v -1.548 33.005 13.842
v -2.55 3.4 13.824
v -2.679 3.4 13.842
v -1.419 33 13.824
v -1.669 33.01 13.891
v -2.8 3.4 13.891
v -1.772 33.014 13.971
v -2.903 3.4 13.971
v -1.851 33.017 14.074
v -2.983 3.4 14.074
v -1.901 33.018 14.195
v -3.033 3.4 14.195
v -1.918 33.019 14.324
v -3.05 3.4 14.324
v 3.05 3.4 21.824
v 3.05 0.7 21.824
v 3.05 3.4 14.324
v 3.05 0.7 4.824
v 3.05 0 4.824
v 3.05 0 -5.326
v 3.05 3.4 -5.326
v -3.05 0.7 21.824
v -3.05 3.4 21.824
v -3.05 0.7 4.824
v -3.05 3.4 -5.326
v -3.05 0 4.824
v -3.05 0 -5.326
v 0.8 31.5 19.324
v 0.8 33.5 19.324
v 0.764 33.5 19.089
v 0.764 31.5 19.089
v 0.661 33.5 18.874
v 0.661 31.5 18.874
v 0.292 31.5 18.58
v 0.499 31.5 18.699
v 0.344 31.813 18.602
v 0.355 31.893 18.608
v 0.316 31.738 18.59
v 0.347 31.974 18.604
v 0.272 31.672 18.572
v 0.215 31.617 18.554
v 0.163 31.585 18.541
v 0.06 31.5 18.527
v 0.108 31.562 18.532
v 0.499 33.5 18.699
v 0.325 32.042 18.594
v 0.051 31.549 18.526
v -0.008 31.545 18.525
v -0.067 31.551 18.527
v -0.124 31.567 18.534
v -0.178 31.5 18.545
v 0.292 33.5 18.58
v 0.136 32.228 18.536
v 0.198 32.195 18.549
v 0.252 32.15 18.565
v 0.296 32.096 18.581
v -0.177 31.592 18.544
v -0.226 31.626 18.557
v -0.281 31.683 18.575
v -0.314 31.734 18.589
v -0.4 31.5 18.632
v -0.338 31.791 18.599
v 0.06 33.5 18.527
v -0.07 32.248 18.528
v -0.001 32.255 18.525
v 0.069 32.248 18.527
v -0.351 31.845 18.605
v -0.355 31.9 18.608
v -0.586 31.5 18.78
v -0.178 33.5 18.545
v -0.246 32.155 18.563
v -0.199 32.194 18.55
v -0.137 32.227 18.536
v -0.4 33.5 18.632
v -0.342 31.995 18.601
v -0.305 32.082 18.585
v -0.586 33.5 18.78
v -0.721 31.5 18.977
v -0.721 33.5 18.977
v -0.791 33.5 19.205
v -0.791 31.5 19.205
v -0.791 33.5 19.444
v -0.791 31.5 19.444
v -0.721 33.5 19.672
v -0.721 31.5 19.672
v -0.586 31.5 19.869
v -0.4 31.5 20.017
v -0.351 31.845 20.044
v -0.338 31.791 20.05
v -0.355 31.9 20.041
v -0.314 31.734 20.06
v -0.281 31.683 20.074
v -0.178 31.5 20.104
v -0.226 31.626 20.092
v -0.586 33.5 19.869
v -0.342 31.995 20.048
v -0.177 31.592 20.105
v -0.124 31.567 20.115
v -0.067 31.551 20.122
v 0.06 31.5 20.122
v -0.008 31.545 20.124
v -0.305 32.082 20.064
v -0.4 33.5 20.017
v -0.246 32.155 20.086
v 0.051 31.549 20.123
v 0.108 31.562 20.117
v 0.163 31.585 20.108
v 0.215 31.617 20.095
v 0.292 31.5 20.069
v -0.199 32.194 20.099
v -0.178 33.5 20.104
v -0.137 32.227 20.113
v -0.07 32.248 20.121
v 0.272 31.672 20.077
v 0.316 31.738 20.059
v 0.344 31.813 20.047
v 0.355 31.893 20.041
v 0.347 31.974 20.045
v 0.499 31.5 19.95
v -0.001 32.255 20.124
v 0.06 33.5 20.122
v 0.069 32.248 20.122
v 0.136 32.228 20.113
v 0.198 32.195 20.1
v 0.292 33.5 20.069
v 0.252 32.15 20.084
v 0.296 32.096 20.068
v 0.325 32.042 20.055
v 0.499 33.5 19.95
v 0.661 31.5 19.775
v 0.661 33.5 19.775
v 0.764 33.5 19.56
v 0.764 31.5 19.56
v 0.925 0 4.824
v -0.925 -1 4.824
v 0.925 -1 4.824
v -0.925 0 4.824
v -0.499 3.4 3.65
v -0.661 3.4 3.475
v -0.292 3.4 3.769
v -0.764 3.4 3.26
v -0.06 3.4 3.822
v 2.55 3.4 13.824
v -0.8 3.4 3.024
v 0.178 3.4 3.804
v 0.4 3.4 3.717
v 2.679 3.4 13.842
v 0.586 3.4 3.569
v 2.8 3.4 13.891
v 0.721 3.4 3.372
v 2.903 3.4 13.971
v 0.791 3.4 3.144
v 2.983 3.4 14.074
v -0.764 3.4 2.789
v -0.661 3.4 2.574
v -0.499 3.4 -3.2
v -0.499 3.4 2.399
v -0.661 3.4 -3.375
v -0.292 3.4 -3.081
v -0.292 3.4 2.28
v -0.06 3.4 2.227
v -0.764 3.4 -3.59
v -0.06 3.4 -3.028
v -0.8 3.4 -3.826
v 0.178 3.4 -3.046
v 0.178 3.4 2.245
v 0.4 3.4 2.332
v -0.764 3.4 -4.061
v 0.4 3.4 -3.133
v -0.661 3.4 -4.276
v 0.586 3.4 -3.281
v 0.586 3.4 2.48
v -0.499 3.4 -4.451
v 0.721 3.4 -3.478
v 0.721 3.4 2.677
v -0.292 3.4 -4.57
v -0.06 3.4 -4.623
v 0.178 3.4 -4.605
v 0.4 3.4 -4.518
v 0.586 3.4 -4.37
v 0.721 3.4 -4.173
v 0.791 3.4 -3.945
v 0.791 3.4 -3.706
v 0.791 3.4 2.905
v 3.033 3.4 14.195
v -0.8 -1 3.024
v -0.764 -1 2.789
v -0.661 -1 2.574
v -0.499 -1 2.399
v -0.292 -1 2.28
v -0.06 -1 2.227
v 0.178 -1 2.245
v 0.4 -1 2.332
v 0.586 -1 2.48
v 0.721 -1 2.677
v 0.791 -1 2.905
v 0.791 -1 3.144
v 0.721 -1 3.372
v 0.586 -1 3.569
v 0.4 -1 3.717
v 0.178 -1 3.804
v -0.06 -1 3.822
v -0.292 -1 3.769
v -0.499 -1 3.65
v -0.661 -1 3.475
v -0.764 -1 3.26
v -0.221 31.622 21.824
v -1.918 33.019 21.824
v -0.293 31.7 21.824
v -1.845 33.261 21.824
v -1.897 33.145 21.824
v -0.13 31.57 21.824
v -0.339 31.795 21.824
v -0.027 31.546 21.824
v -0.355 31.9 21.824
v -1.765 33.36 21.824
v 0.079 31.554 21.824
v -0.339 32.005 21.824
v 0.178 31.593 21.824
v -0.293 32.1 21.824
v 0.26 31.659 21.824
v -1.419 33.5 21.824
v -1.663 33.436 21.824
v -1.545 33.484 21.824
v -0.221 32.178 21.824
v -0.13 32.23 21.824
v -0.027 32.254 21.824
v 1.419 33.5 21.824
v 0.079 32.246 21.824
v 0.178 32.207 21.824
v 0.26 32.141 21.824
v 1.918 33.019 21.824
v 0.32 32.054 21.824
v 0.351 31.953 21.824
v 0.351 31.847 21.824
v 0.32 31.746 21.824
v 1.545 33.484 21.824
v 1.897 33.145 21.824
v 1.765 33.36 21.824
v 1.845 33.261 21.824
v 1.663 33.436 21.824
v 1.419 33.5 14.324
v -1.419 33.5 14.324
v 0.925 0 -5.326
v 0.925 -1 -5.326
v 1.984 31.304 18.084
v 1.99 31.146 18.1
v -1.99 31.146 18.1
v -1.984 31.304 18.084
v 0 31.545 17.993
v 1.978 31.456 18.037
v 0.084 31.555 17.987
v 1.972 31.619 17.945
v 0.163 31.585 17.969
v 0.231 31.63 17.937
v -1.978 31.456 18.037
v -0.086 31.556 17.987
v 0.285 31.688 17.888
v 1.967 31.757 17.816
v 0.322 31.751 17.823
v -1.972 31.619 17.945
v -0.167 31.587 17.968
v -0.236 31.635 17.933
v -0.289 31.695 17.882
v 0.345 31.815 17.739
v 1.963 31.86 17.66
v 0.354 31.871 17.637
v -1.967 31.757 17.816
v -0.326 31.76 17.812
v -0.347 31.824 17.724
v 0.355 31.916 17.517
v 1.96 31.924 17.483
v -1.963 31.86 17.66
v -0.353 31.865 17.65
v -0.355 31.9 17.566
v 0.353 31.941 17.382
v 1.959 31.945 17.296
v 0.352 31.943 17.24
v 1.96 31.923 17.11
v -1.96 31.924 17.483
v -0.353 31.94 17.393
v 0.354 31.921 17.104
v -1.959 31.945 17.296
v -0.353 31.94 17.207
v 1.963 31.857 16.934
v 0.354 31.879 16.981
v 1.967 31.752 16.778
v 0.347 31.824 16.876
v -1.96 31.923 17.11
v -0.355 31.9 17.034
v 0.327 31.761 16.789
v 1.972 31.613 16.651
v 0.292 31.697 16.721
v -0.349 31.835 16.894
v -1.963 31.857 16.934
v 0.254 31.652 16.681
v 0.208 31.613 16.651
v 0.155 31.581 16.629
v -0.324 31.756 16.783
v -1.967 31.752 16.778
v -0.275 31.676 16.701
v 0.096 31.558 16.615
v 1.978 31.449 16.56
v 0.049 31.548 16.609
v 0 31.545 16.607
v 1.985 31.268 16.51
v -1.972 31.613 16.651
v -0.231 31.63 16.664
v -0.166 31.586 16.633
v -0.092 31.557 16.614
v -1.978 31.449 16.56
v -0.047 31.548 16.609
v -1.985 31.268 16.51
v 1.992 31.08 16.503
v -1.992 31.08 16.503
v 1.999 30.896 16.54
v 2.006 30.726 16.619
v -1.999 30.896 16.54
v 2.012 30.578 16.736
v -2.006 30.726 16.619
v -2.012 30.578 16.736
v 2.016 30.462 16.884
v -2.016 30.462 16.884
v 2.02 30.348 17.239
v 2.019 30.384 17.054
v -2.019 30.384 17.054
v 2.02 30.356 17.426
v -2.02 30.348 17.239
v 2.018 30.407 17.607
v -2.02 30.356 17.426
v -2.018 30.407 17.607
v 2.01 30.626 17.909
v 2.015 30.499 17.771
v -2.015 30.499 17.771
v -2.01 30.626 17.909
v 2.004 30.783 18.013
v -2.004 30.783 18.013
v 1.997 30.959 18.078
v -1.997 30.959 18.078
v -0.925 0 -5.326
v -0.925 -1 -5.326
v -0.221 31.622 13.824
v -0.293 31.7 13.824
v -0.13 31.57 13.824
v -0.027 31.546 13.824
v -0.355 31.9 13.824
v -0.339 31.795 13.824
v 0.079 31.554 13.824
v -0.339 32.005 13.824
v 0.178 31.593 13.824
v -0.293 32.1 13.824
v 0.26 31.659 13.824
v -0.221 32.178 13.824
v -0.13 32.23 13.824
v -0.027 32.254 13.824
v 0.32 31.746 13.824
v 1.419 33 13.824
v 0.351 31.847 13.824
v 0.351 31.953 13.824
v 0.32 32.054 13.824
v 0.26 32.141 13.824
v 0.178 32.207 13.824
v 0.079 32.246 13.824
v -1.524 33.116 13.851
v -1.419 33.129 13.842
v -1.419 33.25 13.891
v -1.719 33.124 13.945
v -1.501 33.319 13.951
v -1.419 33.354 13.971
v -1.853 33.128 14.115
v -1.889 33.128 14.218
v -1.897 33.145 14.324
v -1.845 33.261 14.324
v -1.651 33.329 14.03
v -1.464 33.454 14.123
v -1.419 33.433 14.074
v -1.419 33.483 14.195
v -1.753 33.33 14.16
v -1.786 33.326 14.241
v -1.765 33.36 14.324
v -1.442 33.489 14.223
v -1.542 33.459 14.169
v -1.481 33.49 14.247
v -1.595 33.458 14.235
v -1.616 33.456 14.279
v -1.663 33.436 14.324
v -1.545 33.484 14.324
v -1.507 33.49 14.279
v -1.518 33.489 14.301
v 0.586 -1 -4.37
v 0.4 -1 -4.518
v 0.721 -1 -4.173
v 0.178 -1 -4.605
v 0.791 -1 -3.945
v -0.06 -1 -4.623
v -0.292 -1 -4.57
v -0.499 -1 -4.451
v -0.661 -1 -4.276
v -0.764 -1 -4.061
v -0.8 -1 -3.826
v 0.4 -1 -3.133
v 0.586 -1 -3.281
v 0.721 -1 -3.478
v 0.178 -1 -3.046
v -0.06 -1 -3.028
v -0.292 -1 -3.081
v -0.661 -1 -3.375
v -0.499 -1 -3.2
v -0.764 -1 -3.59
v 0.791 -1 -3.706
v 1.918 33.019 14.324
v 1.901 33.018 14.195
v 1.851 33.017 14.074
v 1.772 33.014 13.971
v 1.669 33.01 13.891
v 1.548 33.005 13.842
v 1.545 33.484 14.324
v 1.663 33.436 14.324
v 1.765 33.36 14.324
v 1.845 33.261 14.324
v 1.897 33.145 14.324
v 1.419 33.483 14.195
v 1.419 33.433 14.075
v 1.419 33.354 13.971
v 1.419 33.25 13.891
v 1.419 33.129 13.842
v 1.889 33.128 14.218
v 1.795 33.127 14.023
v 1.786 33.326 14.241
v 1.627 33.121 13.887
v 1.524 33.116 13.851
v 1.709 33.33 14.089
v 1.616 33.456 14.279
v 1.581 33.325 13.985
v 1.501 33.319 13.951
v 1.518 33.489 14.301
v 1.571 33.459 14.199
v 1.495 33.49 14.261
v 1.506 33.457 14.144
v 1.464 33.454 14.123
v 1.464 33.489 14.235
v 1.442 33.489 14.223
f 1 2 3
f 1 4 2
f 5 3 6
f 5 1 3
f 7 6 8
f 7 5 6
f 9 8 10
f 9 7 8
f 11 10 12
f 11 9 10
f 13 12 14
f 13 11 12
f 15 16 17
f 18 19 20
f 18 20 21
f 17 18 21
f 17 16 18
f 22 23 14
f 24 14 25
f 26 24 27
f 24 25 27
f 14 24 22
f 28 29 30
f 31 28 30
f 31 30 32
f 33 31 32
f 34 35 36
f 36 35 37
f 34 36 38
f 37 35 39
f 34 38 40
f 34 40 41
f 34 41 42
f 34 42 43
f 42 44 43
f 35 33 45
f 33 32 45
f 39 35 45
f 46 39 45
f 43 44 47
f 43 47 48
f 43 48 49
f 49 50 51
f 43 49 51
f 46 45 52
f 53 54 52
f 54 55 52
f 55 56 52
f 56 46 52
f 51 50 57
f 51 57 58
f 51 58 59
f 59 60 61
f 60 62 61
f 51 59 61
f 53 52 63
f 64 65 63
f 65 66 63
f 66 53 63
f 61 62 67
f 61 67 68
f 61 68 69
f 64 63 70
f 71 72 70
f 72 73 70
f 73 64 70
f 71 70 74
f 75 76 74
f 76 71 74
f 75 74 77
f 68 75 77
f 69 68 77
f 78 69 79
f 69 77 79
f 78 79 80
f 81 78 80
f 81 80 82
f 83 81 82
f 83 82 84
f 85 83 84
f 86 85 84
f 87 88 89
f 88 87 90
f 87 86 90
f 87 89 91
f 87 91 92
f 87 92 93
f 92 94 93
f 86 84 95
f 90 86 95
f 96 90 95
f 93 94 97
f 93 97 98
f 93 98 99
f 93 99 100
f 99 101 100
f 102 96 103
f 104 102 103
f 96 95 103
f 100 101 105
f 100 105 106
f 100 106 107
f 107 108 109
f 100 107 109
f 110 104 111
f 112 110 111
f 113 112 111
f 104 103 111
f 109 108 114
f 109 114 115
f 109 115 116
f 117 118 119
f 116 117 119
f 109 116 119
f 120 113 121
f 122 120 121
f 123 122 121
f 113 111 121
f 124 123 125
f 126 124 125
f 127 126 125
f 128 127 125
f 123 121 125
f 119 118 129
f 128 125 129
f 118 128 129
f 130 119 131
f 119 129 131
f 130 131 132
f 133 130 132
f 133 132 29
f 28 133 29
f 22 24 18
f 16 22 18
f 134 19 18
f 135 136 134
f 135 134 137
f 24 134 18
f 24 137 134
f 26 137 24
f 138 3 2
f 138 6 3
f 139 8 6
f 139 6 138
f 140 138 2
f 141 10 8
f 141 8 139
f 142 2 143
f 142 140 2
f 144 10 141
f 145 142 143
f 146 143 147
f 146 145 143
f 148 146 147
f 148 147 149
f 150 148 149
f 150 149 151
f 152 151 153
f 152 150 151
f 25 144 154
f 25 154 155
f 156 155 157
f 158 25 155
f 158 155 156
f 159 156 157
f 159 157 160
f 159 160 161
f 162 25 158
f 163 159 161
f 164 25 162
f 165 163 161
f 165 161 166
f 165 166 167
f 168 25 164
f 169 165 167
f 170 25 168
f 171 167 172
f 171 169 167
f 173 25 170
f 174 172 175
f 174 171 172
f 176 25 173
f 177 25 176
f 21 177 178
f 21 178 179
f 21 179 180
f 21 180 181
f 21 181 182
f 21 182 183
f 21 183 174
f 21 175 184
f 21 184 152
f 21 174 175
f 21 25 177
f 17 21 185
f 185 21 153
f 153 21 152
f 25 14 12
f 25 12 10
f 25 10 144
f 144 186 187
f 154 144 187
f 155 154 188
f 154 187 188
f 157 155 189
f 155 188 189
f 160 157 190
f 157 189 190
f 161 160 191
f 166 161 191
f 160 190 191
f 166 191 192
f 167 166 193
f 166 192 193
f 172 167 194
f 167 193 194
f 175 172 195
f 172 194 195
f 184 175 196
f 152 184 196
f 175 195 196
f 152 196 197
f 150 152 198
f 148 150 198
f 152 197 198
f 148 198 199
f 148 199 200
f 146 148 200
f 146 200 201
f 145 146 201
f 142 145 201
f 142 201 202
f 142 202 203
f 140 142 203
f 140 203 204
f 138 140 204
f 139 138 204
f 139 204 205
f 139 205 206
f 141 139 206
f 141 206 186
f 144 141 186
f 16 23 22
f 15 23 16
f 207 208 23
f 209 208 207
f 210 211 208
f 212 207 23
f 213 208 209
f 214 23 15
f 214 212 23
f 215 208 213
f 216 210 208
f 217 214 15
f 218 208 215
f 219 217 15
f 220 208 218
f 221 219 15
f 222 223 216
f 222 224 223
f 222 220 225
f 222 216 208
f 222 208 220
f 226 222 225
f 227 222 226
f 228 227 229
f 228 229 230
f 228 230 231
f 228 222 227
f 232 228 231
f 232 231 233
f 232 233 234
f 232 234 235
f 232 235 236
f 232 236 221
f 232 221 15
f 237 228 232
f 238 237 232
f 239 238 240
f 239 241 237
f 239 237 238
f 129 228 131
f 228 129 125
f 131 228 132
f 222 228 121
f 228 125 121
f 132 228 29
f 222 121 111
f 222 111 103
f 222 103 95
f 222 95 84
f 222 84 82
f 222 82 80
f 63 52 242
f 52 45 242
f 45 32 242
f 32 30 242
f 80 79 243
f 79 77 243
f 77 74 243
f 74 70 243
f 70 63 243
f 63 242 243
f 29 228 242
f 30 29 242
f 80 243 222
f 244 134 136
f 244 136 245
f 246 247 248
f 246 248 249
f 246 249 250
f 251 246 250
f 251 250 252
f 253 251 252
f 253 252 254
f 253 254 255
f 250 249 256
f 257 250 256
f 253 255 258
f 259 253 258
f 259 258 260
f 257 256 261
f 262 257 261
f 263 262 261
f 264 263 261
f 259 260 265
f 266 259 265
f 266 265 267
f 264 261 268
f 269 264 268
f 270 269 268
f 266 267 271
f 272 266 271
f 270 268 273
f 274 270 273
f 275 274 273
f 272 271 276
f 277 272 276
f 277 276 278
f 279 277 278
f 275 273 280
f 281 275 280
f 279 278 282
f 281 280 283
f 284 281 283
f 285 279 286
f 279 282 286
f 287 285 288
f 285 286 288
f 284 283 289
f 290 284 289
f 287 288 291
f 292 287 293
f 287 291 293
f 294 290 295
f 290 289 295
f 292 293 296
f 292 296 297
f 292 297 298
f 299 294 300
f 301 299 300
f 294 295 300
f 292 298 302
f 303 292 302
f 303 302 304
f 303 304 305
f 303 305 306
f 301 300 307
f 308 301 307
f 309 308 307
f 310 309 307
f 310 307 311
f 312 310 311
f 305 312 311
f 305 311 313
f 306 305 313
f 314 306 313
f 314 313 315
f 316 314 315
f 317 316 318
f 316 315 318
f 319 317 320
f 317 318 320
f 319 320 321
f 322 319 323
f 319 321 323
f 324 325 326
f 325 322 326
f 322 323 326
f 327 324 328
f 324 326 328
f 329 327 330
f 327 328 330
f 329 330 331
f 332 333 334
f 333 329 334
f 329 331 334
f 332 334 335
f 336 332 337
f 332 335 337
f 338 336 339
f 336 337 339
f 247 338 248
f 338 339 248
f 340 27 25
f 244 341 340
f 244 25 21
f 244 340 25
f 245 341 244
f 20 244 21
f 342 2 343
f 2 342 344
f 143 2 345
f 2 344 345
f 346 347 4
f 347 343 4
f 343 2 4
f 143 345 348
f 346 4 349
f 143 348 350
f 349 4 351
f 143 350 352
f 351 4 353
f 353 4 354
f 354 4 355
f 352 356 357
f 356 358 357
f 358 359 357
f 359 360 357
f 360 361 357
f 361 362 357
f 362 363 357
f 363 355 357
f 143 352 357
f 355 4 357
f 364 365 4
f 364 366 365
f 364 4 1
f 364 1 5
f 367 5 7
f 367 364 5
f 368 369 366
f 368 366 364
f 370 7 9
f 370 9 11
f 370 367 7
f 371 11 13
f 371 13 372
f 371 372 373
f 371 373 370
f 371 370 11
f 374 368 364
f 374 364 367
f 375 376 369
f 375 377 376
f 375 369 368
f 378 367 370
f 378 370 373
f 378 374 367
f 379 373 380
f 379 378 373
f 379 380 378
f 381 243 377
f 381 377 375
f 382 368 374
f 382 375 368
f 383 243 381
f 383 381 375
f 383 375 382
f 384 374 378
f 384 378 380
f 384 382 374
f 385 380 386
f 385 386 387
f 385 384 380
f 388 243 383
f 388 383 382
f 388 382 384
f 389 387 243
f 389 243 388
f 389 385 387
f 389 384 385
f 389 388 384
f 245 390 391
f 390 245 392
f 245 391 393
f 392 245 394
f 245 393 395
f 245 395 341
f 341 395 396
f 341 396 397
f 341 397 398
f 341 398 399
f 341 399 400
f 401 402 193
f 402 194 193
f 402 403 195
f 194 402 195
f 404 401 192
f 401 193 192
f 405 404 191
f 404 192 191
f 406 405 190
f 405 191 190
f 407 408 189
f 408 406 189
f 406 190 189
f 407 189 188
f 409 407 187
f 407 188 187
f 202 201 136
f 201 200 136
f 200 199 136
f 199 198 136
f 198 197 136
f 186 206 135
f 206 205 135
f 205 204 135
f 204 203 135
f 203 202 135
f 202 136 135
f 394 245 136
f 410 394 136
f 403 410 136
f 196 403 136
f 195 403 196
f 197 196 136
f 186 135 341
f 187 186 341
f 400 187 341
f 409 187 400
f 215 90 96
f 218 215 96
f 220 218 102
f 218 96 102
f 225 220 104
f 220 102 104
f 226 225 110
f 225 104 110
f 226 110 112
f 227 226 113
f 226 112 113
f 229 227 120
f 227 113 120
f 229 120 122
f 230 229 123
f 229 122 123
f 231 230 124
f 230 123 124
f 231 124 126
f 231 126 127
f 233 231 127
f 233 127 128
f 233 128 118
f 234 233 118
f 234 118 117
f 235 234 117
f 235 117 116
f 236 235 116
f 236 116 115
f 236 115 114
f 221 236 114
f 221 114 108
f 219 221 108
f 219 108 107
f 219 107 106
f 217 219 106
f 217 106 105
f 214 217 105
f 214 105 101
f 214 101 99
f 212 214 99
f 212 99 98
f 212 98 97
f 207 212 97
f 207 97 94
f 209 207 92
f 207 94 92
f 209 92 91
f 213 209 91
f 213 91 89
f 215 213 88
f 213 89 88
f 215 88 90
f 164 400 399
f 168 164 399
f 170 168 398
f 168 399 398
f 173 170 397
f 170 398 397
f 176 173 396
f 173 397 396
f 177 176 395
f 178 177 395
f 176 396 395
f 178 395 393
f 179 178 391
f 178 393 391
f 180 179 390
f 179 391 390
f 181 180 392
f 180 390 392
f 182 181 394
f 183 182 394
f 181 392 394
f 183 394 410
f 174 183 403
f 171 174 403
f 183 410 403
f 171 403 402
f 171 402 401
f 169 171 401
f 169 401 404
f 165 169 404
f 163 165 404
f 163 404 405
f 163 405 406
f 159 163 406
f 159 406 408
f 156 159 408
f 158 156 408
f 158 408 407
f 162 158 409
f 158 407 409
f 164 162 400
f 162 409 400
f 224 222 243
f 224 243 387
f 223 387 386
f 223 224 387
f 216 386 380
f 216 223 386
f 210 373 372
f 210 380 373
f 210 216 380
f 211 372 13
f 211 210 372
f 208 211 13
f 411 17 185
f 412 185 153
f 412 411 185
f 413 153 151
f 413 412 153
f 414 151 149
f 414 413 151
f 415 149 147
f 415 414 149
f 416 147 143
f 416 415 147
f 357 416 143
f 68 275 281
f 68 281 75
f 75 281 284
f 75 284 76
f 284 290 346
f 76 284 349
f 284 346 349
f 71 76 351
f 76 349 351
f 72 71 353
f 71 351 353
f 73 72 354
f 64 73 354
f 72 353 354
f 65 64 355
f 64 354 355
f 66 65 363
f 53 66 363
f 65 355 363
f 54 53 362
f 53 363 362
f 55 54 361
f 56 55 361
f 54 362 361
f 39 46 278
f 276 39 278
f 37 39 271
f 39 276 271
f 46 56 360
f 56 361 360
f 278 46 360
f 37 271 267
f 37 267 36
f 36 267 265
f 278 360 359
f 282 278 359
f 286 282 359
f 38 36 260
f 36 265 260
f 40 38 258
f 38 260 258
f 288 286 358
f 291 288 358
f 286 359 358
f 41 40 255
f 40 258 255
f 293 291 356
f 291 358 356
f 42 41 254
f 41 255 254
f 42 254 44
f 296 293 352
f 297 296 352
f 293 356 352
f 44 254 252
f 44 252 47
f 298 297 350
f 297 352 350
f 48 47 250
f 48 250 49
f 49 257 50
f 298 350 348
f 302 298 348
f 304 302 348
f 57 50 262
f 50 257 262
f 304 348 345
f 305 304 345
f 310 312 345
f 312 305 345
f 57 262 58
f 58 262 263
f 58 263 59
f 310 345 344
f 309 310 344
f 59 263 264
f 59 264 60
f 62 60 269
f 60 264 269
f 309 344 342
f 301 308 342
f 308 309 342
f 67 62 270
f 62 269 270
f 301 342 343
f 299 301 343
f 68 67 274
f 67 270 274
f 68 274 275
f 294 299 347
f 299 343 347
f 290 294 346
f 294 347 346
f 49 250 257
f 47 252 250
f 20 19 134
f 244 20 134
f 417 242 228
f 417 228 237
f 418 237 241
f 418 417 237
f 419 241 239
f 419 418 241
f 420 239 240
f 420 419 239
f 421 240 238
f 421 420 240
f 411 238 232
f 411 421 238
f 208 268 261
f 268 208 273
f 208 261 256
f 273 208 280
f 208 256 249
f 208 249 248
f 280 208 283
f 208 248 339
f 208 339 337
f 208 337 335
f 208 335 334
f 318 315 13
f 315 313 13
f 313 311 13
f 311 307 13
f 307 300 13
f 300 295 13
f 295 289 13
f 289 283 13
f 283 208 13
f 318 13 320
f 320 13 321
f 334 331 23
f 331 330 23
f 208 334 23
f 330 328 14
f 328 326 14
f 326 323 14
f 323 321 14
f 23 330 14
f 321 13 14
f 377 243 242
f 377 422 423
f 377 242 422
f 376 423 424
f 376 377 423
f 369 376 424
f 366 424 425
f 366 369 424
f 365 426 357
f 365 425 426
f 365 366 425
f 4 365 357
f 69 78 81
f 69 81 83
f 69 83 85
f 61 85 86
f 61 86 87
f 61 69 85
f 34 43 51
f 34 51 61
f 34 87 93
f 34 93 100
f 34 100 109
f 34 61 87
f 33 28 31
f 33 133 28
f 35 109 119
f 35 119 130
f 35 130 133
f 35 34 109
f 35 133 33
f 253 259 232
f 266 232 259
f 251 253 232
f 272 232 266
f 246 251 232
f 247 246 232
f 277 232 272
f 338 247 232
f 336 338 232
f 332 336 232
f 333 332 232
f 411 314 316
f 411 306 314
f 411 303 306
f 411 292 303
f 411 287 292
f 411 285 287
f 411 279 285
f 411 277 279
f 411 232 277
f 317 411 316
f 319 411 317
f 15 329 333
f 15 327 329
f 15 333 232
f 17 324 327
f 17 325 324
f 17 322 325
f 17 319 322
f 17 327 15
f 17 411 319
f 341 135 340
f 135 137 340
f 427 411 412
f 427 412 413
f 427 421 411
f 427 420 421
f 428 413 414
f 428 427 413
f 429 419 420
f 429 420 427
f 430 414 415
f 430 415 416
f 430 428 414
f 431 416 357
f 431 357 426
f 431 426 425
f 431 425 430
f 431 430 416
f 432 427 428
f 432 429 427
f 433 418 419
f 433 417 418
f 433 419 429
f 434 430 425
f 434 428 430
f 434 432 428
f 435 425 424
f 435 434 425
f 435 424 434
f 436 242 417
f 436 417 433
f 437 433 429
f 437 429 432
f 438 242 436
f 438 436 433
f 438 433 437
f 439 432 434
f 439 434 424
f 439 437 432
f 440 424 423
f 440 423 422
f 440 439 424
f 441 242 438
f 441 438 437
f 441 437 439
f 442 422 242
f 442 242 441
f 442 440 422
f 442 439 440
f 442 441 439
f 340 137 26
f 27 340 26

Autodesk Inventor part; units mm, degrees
ref_plane "YZ Plane" through (0, 0, 0) normal (1, 0, 0) x (0, 1, 0)
ref_plane "XZ Plane" through (0, 0, 0) normal (0, 1, 0) x (-1, 0, 0)
sketch "Sketch1" plane through (0, 0, 0) normal (0, 1, 0) x (-1, 0, 0)
  line L0 (3.05, -5.3255) -> (-3.05, -5.3255)
  line L1 (-3.05, -5.3255) -> (-3.05, 4.8245)
  line L2 (-3.05, 4.8245) -> (3.05, 4.8245)
  line L3 (3.05, 4.8245) -> (3.05, -5.3255)
  line L4 (0.925, 4.8245) -> (-0.925, 4.8245)
  line L5 (0.925, 4.8245) -> (0.925, -5.3255)
  line L6 (-0.925, 4.8245) -> (-0.925, -5.3255)
  circle A0 centre (0, 3.0245) radius 0.8
  circle A1 centre (0, -3.8255) radius 0.8
  line L7 (0, 4.8245) -> (0, -5.3255)
  line L8 (-3.05, 0) -> (3.05, 0)
  point P0 (0, 0)
  dimension "d13" = 6.1
  dimension "d44" = 1.85
  dimension "d45" = 2.125
  dimension "d46" = 1.6
  dimension "d47" = 1.6
  dimension "d128" = 6.85
extrude "Extrusion1" add sketch "Sketch1" along normal blind 3.4 contours L0 L5 L8 L3 | L0 L7 A1 L8 L5 | L8 L5 L2 L3 | L0 L6 L8 L7 A1 | L8 L7 A0 L2 L5 | L0 L1 L8 L6 | L8 L6 L2 L7 A0 | L8 L1 L2 L6
extrude "Extrusion6" add sketch "Sketch1" against normal blind 1 contours L0 L7 A1 L8 L5 | L0 L6 L8 L7 A1 | L8 L7 A0 L2 L5 | L8 L6 L2 L7 A0
sketch "Sketch13" plane through (-3.05, 3.4, 4.8245) normal (0, 0, 1) x (1, 0, 0)
  line L0 (0, 0) -> (0, -2.7)
  line L1 (0, -3.4) -> (0, 0) projected
  line L2 (0, -2.7) -> (6.1, -2.7)
  line L3 (6.1, -3.4) -> (6.1, 0) projected
  line L4 (6.1, 0) -> (6.1, -2.7)
  line L5 (0, 0) -> (6.1, 0)
  point P0 (3.05, -3.4)
  point P1 (6.1, -3.41)
  dimension "d56" = 2.7
extrude "Extrusion8" add sketch "Sketch13" along normal blind 17
sketch "Sketch17" plane through (-3.05, 3.4, 21.8245) normal (0, 0, 1) x (1, 0, 0)
  line L0 (6.1, 0) -> (0, 0) projected
  line L1 (6.1, 0) -> (19.567, 0) construction
  line L2 (16.968, 8.2706) -> (10.0894, 18.4685)
  line L3 (10.0894, 18.4685) -> (13.5713, 20.8172)
  line L4 (13.5713, 20.8172) -> (20.102, 11.1351)
  line L5 (20.102, 11.1351) -> (22.1374, 8.1174)
  line L6 (6.1, -3.4) -> (6.1, -2.7) projected
  line L7 (22.1374, 8.1174) -> (6.1, -2.7)
  line L8 (6.1, 0) -> (6.1, -2.7)
  line L9 (6.1, 0.94) -> (6.1, 0)
  line L10 (6.1, 0.94) -> (3.05, 0.94)
  line L11 (3.05, 0.94) -> (3.05, 0)
  line L12 (16.968, 8.2706) -> (6.1, 0.94)
  line L13 (6.1, 0.94) -> (7.7497, 0.94)
  point P0 (3.05, -3.4)
  dimension "d74" = 12.301
  dimension "d75" = 4.2
  dimension "d92" = 3.64
  dimension "d93" = 3.64
  dimension "d94" = 10.868
  dimension "d98" = 34
extrude "Extrusion12" [suppressed]
ref_plane "Work Plane3" through (-3.05, 3.4, 13.8245) normal (0, 0, 1) x (1, 0, 0)
sketch "Sketch29" plane through (-3.05, 3.4, 13.8245) normal (0, 0, 1) x (1, 0, 0)
  line L0 (3.85, -4.4) -> (2.25, -4.4) projected
  line L1 (3.05, -4.4) -> (3.05, 30.1)
  line L2 (4.95, 30.1) -> (3.05, 30.1)
  line L3 (3.05, 30.1) -> (1.15, 30.1)
  line L4 (6.1, -3.4) -> (6.1, 0) projected
  line L5 (4.95, 30.1) -> (6.1, 0)
  line L6 (0, -3.4) -> (0, 0) projected
  line L7 (1.15, 30.1) -> (0, 0)
  line L8 (0, 0) -> (6.1, 0)
  point P0 (3.05, -3.4)
  point P1 (3.0506, 28.6)
  dimension "d137" = 34.5
  dimension "d138" = 3.8
extrude "Extrusion20" add sketch "Sketch29" along normal blind 8
fillet "Fillet6" radius 0.5 2 edges at (2.475, 18.45, 13.8245) (-2.475, 18.45, 13.8245)
sketch "Sketch14" plane through (0, 3.4, 0) normal (0, 1, 0) x (1, 0, 0)
  line L0 (3.05, 5.3255) -> (3.05, -21.8245) projected
  line L1 (3.05, -21.8245) -> (3.05, -13.8245)
  line L2 (3.05, -13.8245) -> (-3.05, -13.8245)
  line L3 (-3.05, 5.3255) -> (-3.05, -21.8245) projected
  line L4 (-3.05, -21.8245) -> (3.05, -21.8245)
  point P0 (0, 0)
  dimension "d59" = 8
extrude "Extrusion9" [suppressed]
sketch "Sketch16" plane through (0, 35.4, 0) normal (0, 1, 0) x (1, 0, 0)
  circle A0 centre (-0.1175, -18.652) radius 1.5
  line L0 (1.9325, -20.707) -> (-1.9325, -20.707) projected
  line L1 (1.9325, -14.9419) -> (1.9325, -20.707) projected
  point P0 (0, 0)
  point P1 (0, -20.707)
  dimension "d67" = 3
  dimension "d68" = 2.055
  dimension "d69" = 2.05
extrude "Extrusion11" [suppressed]
sketch "Sketch15" plane through (-3.05, 3.4, 21.8245) normal (0, 0, 1) x (1, 0, 0)
  line L0 (2.6762, 10.6502) -> (2.7739, 7.8519) construction
  line L1 (6.1, 0) -> (4.9825, 32) projected
  line L2 (1.6768, 10.6153) -> (1.7746, 7.817)
  line L3 (3.7733, 7.8868) -> (3.6756, 10.6851)
  arc A0 (3.6756, 10.6851) -> (1.6768, 10.6153) centre (2.6762, 10.6502) ccw
  arc A1 (1.7746, 7.817) -> (3.7733, 7.8868) centre (2.7739, 7.8519) ccw
  point P0 (3.05, -3.4)
  point P1 (2.7251, 9.251)
  dimension "d62" = 1.4
  dimension "d63" = 2
  dimension "d64" = 3.05
extrude "Extrusion10" [suppressed]
sketch "Sketch20" plane through (10.5213, 24.2172, 21.8245) normal (-0.5591929, 0.8290376, 0) x (0.8290376, 0.5591929, 0)
  circle A0 centre (-2.15, 2.0494) radius 1.5
  line L0 (-4.2, 0) -> (-4.2, 4.1) projected
  line L1 (0, 0) -> (-4.2, 0) projected
  point P0 (-22.2646, 21.8245)
  point P1 (-2.1, 0)
  dimension "d82" = 3
  dimension "d83" = 2.05
  dimension "d84" = 2.05
extrude "Extrusion14" [suppressed]
sketch "Sketch18" plane through (-3.05, 3.4, 21.8245) normal (0, 0, 1) x (1, 0, 0)
  line L0 (12.7441, 18.3775) -> (14.3099, 16.0562) construction
  line L1 (11.9151, 17.8183) -> (13.4808, 15.497)
  line L2 (15.1389, 16.6154) -> (13.5732, 18.9367)
  arc A0 (13.5732, 18.9367) -> (11.9151, 17.8183) centre (12.7441, 18.3775) ccw
  arc A1 (13.4808, 15.497) -> (15.1389, 16.6154) centre (14.3099, 16.0562) ccw
  line L3 (22.1374, 8.1174) -> (13.5713, 20.8172) projected
  line L4 (10.0894, 18.4685) -> (13.5713, 20.8172) projected
  point P0 (3.05, -3.4)
  point P1 (13.527, 17.2169)
  point P2 (12.1849, 19.2066)
  dimension "d78" = 1.4
  dimension "d79" = 2
  dimension "d89" = 0.56
  dimension "d90" = 2.05
extrude "Extrusion13" [suppressed]
sketch "Sketch21" plane through (13.7716, 15.5536, 19.7751) normal (-0.5591929, 0.8290376, 0) x (0.8290376, 0.5591929, 0)
  circle A0 centre (0, 0) radius 0.868
  point P0 (-20.1146, 19.7751)
extrude "Extrusion15" [suppressed]
mirror "Mirror3" [suppressed]
chamfer "Chamfer1" [suppressed]
fillet "Fillet1" [suppressed]
sketch "Sketch24" plane through (-3.05, 0, -5.3255) normal (-1, 0, 0) x (0, 0, 1)
  circle A0 centre (22.6257, 31.1455) radius 0.8
  point P0 (5.3255, 0)
  point P1 (27.15, 0.7)
  dimension "d109" = 1.6
extrude "Extrusion18" cut sketch "Sketch24" against normal through all
sketch "Sketch26" plane through (0, 35.4, 0) normal (0, 1, 0) x (1, 0, 0)
  circle A0 centre (0, -19.1945) radius 0.8
  point P0 (0, 0)
  dimension "d131" = 1.6
extrude "Extrusion19" [suppressed]
fillet "Fillet4" [suppressed]
sketch "Sketch31" plane through (-3.05, 3.4, 13.8245) normal (0, 0, -1) x (-1, 0, 0)
  line L0 (-3.05, -3.4) -> (-3.05, 28.5)
  circle A0 centre (-3.05, 28.5) radius 0.355
  dimension "d145" = 31.9
  dimension "d147" = 0.71
extrude "Extrusion22" cut sketch "Sketch31" against normal through all
sketch "Sketch33" plane through (-1.9, 33.5, 21.8245) normal (0, 1, 0) x (1, 0, 0)
  line L0 (3.8, 0) -> (0, 0) projected
  line L1 (3.8, 7.5) -> (3.8, 0) projected
  line L2 (0, 7.5) -> (0, 0) projected
  circle A0 centre (1.9, 2.5) radius 0.8
  line L3 (1.9, 2.5) -> (3.8, 2.5)
  line L4 (1.9, 2.5) -> (0, 2.5)
  point P0 (1.9, 21.8245)
  dimension "d150" = 1.6
  dimension "d151" = 2.5
extrude "Extrusion23" cut sketch "Sketch33" against normal blind 2 contours L3 L4 A0 | A0 L4 L3
fillet "Fillet7" radius 0.5 4 edges at (-1.9, 33.5, 18.0745) (1.7534, 33.5, 13.9709) (0, 33.5, 13.8245) (1.9, 33.5, 18.0745)
sketch "Sketch34" plane through (-3.05, 3.4, 13.8245) normal (0, 0, -1) x (-1, 0, 0)
  point P0 (-3.05, -3.4)
equation "\"d13\" = base_width"
equation "\"d45\" = -0.5 * d44 + 0.5 * d13"
equation "\"d4\" = base_length"
equation "\"base_width\" = 6.1"
equation "\"base_length\" = 3.4"
equation "\"base_screw_diameter\" = 1.5"
equation "\"base_screw_spacing_edge\" = 8.5"
equation "\"multi_angle\" = 34deg"
properties part number "microstim_holder_bottom"
